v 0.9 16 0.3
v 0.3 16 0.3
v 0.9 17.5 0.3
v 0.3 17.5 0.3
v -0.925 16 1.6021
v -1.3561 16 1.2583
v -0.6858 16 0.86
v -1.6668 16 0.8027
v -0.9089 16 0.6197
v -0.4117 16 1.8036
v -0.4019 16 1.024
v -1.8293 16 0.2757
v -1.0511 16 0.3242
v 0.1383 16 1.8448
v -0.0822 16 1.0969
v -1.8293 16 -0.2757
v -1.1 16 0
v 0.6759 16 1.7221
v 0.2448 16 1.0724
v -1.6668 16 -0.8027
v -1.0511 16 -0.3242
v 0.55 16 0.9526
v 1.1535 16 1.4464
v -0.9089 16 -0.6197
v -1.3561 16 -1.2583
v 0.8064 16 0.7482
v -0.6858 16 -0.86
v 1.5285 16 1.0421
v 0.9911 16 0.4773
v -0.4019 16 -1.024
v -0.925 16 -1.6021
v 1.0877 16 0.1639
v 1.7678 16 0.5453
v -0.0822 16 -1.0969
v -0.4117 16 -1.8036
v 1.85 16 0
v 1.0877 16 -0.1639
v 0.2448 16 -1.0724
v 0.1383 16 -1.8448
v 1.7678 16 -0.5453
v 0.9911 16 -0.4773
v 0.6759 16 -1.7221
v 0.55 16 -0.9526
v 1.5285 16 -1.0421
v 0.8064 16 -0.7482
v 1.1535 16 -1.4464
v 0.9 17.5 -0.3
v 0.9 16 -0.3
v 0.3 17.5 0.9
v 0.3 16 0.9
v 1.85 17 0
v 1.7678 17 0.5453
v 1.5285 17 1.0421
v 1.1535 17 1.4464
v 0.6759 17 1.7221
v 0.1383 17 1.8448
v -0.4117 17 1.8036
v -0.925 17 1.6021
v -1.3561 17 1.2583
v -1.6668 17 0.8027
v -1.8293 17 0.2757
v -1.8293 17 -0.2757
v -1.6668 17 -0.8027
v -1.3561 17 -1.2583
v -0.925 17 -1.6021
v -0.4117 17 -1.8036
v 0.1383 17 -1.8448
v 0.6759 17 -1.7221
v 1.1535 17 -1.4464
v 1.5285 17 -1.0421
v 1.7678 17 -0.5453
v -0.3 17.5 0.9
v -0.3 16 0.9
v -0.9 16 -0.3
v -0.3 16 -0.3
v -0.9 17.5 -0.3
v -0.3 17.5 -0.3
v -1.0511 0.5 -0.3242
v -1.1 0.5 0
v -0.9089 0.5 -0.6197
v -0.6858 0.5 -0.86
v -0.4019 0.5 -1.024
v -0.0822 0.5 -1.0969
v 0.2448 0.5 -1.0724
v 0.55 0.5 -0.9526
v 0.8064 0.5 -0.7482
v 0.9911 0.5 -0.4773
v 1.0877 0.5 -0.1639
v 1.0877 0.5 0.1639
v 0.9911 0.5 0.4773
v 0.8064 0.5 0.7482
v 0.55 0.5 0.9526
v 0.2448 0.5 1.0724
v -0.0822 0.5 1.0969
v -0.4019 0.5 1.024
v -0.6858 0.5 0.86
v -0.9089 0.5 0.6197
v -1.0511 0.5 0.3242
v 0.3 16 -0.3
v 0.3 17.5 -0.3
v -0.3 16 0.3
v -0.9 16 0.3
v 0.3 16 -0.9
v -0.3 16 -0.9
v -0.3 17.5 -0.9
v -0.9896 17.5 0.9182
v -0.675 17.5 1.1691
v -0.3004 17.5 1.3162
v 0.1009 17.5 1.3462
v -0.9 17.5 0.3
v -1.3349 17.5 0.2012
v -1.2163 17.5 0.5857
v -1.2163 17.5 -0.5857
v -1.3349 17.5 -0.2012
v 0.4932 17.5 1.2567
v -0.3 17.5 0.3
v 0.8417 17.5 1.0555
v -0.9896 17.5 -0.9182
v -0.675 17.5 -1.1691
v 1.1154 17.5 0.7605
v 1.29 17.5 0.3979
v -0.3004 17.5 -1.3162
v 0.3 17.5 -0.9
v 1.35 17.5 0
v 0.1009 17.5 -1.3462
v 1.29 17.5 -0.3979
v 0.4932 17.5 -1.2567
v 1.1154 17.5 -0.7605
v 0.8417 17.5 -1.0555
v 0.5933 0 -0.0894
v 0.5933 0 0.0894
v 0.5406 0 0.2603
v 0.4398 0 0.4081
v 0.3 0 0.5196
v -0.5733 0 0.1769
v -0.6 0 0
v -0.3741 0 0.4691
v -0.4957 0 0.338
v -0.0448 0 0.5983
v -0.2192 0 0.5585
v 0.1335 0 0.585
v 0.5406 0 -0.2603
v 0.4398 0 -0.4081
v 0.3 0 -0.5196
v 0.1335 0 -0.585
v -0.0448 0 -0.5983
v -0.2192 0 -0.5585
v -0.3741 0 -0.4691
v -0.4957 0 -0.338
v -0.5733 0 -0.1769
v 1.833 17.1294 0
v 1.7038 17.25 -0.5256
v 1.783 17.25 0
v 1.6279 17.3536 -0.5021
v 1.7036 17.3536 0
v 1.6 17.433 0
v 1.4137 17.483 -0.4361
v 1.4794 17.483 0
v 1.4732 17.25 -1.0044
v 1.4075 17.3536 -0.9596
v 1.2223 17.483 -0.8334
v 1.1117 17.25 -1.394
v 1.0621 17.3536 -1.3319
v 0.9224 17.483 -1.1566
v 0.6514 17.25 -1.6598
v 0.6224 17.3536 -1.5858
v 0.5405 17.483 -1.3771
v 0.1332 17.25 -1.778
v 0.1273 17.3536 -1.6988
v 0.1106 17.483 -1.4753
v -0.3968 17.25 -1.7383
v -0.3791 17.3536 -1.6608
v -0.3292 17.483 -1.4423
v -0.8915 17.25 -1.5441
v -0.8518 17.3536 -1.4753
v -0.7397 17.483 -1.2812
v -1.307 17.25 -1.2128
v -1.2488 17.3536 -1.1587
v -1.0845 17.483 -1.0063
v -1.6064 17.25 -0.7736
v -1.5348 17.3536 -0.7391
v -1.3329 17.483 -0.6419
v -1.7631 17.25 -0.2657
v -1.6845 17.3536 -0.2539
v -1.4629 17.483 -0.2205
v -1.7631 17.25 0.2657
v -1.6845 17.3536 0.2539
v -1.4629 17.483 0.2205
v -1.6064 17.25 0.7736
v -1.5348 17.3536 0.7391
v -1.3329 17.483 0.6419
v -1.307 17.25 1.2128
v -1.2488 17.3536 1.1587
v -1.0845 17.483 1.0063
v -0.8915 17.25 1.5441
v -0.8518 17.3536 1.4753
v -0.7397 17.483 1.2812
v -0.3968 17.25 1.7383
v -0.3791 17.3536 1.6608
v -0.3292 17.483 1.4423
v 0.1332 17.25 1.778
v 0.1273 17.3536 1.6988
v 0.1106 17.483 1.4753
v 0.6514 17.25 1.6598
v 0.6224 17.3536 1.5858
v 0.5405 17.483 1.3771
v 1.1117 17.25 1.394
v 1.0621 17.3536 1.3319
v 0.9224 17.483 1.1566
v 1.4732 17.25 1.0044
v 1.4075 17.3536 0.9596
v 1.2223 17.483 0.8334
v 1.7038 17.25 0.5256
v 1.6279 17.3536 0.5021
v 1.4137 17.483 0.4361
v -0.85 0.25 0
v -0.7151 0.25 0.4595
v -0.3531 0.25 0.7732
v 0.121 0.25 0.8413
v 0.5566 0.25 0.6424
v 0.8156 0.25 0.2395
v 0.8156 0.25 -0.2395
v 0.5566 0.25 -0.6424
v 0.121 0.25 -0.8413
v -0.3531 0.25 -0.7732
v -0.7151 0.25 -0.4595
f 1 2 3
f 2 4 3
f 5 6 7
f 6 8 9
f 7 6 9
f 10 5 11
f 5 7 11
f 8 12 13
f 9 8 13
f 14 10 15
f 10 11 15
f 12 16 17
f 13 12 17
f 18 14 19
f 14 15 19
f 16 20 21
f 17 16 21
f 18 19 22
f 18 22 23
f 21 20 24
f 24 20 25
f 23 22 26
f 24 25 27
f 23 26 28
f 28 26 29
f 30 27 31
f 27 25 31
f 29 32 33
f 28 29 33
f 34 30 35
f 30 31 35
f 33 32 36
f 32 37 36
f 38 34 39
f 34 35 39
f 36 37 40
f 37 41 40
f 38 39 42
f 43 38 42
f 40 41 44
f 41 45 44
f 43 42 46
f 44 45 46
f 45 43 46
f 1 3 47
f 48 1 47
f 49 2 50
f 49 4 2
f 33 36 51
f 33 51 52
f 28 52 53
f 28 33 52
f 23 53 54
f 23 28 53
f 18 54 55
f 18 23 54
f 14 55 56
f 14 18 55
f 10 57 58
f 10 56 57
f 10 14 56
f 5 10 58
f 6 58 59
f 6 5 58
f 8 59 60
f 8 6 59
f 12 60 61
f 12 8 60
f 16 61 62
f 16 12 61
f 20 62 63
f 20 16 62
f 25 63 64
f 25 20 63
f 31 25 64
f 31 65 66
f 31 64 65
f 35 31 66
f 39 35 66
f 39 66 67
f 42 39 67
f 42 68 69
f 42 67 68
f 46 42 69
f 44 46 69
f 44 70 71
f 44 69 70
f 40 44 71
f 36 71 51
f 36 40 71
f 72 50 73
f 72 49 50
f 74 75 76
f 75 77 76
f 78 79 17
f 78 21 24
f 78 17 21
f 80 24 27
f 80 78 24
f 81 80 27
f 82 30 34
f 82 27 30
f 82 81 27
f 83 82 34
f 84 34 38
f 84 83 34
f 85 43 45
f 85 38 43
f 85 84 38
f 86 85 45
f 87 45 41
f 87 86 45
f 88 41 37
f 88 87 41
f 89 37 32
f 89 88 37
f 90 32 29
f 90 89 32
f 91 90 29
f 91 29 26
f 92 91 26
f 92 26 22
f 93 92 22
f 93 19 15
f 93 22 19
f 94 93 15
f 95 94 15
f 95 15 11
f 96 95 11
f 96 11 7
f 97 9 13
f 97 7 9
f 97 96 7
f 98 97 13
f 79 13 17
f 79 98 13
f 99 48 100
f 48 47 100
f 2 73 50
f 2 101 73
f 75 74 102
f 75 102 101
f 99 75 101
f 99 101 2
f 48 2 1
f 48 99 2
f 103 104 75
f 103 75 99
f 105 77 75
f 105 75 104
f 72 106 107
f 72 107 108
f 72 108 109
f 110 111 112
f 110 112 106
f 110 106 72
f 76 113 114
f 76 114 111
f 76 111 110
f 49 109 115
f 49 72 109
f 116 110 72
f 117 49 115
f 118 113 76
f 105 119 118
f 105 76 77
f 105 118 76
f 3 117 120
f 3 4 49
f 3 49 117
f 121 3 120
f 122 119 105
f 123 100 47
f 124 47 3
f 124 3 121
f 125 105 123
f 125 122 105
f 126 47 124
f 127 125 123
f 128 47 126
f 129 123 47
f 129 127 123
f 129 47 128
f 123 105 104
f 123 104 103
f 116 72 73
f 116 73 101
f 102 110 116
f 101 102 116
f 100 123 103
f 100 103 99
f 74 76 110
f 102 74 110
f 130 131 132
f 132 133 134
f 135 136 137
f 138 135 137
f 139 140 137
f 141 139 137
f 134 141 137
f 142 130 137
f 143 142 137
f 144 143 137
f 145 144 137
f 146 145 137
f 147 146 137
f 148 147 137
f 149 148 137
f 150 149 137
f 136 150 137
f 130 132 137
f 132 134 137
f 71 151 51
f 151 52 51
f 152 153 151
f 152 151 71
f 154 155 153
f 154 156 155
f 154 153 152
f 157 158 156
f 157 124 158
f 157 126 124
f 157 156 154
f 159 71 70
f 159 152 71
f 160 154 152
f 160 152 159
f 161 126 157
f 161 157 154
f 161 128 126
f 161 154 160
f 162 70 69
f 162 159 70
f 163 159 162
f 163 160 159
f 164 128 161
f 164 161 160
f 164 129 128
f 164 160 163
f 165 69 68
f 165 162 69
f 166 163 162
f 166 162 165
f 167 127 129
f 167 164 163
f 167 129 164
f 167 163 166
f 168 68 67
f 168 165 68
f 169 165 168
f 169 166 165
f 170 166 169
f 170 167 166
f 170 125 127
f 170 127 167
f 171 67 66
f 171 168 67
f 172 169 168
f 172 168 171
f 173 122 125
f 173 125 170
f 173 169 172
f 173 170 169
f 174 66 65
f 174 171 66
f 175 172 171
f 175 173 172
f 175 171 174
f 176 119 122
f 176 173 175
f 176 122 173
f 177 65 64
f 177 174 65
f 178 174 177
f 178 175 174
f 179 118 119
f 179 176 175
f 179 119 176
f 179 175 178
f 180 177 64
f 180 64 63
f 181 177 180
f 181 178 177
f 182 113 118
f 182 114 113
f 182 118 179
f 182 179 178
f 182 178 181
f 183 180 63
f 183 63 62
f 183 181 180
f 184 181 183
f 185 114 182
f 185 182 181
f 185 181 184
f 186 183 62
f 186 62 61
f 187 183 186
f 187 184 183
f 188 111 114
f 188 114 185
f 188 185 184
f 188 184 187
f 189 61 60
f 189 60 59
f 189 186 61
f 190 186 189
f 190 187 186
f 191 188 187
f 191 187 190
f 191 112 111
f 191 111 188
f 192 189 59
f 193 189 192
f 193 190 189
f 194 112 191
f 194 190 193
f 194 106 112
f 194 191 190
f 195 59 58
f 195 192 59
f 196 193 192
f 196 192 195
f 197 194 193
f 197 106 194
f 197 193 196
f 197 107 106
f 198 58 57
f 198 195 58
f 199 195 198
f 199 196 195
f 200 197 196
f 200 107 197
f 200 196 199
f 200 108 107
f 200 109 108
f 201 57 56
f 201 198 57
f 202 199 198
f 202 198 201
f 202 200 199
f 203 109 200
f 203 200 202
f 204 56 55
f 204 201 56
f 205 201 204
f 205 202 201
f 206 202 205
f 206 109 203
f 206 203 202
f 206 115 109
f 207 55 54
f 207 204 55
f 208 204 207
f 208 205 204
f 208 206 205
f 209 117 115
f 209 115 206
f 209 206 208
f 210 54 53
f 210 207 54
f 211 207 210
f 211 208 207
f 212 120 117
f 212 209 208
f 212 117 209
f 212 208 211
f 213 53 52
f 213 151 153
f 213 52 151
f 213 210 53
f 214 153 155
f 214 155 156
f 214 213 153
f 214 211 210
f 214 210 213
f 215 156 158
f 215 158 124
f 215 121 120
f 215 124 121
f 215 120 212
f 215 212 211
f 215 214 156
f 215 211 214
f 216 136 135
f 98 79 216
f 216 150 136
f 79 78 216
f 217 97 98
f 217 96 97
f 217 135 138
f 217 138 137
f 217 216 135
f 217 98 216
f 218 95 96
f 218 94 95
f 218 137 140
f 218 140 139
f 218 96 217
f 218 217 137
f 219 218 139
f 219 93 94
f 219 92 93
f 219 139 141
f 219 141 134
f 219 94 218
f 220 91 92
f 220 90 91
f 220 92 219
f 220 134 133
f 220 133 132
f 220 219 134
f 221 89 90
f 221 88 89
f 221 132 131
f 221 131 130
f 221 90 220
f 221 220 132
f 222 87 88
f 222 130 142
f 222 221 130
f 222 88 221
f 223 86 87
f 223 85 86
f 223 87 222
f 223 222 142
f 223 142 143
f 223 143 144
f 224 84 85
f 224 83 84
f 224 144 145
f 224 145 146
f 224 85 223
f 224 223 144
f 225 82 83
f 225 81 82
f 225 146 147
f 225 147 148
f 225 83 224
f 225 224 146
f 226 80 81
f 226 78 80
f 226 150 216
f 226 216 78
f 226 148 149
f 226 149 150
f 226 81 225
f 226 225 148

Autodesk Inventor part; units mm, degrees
ref_plane "YZ Plane" through (0, 0, 0) normal (1, 0, 0) x (0, 1, 0)
ref_plane "XZ Plane" through (0, 0, 0) normal (0, 1, 0) x (-1, 0, 0)
ref_plane "XY Plane" through (0, 0, 0) normal (0, 0, 1) x (1, 0, 0)
sketch "Sketch1" plane through (0, 0, 0) normal (0, 1, 0) x (-1, 0, 0)
  circle A0 centre (0, 0) radius 1.1
  dimension "d0" = 2.2
extrude "Extrusion1" add sketch "Sketch1" along normal blind 16
sketch "Sketch2" plane through (0, 16, 0) normal (0, 1, 0) x (1, 0, 0)
  circle A0 centre (0, 0) radius 1.85
  dimension "d3" = 3.7
extrude "Extrusion2" add sketch "Sketch2" along normal blind 1.5
fillet "Fillet1" radius 0.5 1 edges at (-1.85, 17.5, 0)
sketch "Sketch3" plane through (0, 17.5, 0) normal (0, 1, 0) x (1, 0, 0)
  line L0 (0.3, -0.9) -> (-0.3, -0.9)
  line L1 (-0.3, 0.9) -> (0.3, 0.9)
  line L2 (0.3, -0.9) -> (-0.3, 0.9) construction
  line L3 (-0.3, -0.9) -> (0.3, 0.9) construction
  line L4 (-0.9, 0.3) -> (-0.9, -0.3)
  line L5 (0.9, -0.3) -> (0.9, 0.3)
  line L6 (0.9, 0.3) -> (-0.9, -0.3) construction
  line L7 (-0.9, 0.3) -> (0.9, -0.3) construction
  line L8 (-0.3, -0.9) -> (-0.3, -0.3)
  line L9 (-0.3, 0.3) -> (-0.3, 0.9)
  line L10 (0.3, 0.9) -> (0.3, 0.3)
  line L11 (0.3, -0.3) -> (0.3, -0.9)
  line L12 (-0.9, -0.3) -> (-0.3, -0.3)
  line L13 (0.3, -0.3) -> (0.9, -0.3)
  line L14 (-0.3, 0.3) -> (-0.9, 0.3)
  line L15 (0.9, 0.3) -> (0.3, 0.3)
  point P0 (0, 0)
  dimension "d7" = 0.6
  dimension "d8" = 1.8
  dimension "d9" = 1.8
  dimension "d10" = 0.6
  dimension "d11" = 0.6
  dimension "d12" = 0.6
  dimension "d13" = 0.6
  dimension "d14" = 0.6
extrude "Extrusion3" cut sketch "Sketch3" against normal blind 1.5
chamfer "Chamfer1" distance 0.5 angle 45 1 edges at (1.1, 0, 0)
properties part number "screwKa22x16"
